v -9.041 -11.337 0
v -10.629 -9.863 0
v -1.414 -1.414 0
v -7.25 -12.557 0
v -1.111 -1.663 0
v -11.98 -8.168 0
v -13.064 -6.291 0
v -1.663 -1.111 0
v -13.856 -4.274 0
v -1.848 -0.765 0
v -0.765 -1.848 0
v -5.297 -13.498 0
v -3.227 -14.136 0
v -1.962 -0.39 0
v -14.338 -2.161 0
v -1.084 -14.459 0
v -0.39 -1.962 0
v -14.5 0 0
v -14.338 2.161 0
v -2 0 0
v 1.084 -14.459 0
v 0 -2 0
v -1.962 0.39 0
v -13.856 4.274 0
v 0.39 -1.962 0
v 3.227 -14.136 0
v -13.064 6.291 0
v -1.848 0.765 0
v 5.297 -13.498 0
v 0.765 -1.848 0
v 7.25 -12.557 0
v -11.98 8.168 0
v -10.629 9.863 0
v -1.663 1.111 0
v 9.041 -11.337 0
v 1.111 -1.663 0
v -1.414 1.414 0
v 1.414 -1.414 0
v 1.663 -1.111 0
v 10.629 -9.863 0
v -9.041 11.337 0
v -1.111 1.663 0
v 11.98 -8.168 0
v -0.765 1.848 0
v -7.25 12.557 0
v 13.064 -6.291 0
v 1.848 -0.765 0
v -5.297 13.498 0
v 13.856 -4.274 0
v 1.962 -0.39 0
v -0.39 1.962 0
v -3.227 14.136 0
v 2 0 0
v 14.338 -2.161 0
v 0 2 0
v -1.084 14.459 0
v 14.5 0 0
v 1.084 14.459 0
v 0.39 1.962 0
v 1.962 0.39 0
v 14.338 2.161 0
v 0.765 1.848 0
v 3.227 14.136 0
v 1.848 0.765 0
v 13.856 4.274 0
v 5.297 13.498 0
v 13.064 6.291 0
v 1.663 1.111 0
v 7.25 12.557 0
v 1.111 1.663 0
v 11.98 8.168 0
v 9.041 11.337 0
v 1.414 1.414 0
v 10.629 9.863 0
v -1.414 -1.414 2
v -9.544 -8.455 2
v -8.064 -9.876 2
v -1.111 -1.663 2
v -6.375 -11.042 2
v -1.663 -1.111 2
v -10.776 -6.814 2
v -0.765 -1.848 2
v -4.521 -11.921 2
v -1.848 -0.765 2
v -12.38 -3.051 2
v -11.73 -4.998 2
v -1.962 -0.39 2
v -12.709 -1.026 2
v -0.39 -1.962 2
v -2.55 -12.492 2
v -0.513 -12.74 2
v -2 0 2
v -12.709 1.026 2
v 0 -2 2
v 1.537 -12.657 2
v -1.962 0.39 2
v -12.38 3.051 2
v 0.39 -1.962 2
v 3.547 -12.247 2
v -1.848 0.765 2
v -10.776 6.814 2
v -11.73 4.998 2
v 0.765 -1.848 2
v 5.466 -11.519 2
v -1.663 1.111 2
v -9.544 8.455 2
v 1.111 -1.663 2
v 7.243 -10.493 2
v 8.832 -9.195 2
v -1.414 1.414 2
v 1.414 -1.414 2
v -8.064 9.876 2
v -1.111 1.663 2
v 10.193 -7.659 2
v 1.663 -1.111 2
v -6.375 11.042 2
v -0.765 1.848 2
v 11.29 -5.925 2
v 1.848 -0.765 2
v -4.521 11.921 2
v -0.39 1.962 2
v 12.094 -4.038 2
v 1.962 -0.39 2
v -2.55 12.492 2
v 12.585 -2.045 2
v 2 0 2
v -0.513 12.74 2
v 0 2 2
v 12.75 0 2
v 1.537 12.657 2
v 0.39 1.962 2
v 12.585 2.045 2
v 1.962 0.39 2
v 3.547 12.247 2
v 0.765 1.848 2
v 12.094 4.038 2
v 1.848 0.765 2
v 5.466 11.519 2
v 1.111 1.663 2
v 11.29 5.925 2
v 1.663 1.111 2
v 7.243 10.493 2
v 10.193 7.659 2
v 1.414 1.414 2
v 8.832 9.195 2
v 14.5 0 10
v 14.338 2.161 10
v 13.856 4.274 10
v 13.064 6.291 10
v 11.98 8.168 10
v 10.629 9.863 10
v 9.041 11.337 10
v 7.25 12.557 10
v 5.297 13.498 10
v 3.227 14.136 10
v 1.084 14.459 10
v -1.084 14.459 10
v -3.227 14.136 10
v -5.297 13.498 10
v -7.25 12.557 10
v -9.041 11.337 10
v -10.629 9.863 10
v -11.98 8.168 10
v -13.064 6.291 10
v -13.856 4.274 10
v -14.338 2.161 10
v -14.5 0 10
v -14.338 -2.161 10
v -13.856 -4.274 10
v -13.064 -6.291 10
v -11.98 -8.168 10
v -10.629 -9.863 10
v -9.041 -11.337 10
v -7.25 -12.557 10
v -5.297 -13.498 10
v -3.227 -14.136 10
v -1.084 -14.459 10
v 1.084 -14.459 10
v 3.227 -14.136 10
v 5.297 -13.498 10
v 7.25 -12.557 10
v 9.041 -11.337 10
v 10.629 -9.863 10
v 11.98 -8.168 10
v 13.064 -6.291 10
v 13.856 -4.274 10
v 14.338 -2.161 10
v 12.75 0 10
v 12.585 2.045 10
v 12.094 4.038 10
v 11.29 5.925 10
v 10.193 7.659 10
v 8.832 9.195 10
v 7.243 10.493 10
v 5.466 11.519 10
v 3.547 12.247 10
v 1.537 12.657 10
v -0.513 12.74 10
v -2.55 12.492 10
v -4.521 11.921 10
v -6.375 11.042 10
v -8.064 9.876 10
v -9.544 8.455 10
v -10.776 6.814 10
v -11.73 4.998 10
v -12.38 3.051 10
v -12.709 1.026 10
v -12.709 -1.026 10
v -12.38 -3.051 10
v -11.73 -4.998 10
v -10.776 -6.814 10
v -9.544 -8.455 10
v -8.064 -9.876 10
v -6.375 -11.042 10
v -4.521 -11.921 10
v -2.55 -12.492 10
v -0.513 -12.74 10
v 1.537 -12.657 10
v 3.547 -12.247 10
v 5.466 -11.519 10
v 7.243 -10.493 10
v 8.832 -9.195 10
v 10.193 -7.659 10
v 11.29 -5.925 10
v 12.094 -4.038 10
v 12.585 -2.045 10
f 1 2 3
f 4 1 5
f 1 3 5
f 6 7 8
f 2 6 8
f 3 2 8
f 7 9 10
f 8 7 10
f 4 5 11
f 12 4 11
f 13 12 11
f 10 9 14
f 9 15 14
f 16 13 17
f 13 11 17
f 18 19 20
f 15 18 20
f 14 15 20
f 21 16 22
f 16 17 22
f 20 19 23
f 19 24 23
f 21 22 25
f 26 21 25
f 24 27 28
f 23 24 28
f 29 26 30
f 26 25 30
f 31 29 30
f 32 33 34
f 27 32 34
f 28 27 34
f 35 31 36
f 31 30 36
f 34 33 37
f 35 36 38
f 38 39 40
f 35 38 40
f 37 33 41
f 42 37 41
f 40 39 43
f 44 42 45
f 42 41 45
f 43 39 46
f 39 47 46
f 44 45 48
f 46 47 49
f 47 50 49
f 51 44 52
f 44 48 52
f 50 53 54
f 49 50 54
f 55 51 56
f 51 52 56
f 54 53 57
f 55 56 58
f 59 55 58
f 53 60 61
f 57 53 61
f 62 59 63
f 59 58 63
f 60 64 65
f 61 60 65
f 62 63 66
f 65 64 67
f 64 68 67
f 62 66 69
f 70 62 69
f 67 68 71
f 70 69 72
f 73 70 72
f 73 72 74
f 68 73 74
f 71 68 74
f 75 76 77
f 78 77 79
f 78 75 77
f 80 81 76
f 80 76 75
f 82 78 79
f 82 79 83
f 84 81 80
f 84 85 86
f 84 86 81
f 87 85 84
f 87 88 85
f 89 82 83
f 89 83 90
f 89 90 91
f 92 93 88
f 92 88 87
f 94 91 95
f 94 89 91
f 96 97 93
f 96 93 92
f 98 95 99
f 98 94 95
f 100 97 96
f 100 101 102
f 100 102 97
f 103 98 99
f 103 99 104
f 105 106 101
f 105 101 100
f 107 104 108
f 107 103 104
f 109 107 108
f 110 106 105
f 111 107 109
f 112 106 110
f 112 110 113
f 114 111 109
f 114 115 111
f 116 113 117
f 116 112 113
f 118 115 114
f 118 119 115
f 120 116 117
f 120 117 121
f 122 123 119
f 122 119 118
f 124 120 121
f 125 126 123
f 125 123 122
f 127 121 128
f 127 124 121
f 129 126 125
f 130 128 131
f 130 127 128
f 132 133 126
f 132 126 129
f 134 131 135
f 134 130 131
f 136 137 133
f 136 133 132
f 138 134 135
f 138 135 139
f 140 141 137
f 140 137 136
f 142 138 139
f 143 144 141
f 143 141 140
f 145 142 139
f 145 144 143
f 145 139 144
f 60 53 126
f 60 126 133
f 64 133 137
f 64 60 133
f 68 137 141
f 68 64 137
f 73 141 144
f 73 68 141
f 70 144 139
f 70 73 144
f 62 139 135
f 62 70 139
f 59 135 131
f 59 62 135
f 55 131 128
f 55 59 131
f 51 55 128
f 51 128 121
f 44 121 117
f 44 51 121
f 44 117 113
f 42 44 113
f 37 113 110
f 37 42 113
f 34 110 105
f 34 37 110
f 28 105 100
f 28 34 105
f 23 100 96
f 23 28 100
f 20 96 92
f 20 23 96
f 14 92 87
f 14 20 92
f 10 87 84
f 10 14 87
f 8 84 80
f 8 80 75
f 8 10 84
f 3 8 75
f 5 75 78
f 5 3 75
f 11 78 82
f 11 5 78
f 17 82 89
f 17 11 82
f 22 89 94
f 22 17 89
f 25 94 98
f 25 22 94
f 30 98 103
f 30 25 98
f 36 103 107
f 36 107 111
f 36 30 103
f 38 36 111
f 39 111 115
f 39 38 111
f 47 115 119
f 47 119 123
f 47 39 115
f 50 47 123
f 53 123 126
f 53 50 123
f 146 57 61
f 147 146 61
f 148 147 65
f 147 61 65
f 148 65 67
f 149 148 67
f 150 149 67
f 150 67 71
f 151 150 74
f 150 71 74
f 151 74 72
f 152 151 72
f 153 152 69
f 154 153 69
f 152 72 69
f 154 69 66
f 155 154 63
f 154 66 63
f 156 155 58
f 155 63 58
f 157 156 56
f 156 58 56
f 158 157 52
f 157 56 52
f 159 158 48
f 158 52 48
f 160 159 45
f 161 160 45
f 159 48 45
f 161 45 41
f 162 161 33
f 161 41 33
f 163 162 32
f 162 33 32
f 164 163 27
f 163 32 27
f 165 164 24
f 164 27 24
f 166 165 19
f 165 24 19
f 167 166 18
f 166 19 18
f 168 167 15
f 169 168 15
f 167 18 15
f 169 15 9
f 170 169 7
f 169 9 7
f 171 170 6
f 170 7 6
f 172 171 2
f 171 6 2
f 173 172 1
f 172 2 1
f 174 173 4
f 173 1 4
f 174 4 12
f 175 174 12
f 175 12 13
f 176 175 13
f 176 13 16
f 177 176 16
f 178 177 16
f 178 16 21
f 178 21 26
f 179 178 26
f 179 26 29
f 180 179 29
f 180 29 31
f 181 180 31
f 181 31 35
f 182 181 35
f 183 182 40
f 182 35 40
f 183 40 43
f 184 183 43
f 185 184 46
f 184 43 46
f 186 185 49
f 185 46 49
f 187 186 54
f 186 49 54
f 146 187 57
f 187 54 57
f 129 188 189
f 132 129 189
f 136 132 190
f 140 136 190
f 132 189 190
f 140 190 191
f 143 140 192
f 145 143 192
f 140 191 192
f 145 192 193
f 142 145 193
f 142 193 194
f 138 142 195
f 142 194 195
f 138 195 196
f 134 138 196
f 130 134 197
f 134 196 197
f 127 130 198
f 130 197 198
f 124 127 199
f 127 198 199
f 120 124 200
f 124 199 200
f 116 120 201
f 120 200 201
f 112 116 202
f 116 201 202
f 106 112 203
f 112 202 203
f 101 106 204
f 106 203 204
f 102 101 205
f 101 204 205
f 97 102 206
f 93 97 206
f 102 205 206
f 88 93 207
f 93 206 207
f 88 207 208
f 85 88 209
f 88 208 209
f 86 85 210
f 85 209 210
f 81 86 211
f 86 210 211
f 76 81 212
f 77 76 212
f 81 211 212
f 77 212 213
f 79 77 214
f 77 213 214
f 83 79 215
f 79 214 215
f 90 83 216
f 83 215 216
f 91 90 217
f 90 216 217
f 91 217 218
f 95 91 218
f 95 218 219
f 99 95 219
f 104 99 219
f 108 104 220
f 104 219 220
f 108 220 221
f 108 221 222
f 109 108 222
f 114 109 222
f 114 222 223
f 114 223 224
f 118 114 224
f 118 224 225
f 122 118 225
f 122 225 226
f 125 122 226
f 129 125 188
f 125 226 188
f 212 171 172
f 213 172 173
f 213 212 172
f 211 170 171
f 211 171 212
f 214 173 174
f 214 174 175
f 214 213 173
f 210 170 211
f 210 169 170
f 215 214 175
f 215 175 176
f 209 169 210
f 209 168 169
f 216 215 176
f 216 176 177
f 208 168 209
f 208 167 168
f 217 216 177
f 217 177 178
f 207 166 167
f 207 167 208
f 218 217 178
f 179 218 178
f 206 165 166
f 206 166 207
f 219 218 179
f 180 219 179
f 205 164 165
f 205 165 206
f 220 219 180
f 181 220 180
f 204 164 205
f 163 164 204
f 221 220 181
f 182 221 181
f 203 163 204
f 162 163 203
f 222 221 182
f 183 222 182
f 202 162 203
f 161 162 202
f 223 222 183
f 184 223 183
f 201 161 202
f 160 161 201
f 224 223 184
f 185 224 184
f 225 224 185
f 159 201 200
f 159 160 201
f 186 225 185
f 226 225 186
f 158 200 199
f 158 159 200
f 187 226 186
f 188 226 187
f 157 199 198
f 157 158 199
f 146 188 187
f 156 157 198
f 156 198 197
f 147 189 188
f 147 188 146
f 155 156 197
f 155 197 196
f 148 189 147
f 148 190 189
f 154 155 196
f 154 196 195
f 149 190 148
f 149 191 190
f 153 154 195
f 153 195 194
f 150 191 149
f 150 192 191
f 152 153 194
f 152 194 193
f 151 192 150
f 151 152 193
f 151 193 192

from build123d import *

# Parameters (mm, degrees)
F0_R     = 14.5
F1_DEPTH = 10
F2_R     = 12.75
F3_DEPTH = 8
F4_R     = 2
F5_DEPTH = 2


with BuildPart() as f1:
    # F0 (on Top) → F1 (new body)
    with BuildSketch(Plane.XY):
        Circle(F0_R)
    extrude(amount=F1_DEPTH)

    # F2 (on face) → F3 (cut)
    with BuildSketch(Plane.XY.offset(10)):
        Circle(F2_R)
    extrude(amount=-F3_DEPTH, mode=Mode.SUBTRACT)

    # F4 (on Top) → F5 (cut)
    with BuildSketch(Plane.XY):
        Circle(F4_R)
    extrude(amount=F5_DEPTH, mode=Mode.SUBTRACT)


solid = f1.part
